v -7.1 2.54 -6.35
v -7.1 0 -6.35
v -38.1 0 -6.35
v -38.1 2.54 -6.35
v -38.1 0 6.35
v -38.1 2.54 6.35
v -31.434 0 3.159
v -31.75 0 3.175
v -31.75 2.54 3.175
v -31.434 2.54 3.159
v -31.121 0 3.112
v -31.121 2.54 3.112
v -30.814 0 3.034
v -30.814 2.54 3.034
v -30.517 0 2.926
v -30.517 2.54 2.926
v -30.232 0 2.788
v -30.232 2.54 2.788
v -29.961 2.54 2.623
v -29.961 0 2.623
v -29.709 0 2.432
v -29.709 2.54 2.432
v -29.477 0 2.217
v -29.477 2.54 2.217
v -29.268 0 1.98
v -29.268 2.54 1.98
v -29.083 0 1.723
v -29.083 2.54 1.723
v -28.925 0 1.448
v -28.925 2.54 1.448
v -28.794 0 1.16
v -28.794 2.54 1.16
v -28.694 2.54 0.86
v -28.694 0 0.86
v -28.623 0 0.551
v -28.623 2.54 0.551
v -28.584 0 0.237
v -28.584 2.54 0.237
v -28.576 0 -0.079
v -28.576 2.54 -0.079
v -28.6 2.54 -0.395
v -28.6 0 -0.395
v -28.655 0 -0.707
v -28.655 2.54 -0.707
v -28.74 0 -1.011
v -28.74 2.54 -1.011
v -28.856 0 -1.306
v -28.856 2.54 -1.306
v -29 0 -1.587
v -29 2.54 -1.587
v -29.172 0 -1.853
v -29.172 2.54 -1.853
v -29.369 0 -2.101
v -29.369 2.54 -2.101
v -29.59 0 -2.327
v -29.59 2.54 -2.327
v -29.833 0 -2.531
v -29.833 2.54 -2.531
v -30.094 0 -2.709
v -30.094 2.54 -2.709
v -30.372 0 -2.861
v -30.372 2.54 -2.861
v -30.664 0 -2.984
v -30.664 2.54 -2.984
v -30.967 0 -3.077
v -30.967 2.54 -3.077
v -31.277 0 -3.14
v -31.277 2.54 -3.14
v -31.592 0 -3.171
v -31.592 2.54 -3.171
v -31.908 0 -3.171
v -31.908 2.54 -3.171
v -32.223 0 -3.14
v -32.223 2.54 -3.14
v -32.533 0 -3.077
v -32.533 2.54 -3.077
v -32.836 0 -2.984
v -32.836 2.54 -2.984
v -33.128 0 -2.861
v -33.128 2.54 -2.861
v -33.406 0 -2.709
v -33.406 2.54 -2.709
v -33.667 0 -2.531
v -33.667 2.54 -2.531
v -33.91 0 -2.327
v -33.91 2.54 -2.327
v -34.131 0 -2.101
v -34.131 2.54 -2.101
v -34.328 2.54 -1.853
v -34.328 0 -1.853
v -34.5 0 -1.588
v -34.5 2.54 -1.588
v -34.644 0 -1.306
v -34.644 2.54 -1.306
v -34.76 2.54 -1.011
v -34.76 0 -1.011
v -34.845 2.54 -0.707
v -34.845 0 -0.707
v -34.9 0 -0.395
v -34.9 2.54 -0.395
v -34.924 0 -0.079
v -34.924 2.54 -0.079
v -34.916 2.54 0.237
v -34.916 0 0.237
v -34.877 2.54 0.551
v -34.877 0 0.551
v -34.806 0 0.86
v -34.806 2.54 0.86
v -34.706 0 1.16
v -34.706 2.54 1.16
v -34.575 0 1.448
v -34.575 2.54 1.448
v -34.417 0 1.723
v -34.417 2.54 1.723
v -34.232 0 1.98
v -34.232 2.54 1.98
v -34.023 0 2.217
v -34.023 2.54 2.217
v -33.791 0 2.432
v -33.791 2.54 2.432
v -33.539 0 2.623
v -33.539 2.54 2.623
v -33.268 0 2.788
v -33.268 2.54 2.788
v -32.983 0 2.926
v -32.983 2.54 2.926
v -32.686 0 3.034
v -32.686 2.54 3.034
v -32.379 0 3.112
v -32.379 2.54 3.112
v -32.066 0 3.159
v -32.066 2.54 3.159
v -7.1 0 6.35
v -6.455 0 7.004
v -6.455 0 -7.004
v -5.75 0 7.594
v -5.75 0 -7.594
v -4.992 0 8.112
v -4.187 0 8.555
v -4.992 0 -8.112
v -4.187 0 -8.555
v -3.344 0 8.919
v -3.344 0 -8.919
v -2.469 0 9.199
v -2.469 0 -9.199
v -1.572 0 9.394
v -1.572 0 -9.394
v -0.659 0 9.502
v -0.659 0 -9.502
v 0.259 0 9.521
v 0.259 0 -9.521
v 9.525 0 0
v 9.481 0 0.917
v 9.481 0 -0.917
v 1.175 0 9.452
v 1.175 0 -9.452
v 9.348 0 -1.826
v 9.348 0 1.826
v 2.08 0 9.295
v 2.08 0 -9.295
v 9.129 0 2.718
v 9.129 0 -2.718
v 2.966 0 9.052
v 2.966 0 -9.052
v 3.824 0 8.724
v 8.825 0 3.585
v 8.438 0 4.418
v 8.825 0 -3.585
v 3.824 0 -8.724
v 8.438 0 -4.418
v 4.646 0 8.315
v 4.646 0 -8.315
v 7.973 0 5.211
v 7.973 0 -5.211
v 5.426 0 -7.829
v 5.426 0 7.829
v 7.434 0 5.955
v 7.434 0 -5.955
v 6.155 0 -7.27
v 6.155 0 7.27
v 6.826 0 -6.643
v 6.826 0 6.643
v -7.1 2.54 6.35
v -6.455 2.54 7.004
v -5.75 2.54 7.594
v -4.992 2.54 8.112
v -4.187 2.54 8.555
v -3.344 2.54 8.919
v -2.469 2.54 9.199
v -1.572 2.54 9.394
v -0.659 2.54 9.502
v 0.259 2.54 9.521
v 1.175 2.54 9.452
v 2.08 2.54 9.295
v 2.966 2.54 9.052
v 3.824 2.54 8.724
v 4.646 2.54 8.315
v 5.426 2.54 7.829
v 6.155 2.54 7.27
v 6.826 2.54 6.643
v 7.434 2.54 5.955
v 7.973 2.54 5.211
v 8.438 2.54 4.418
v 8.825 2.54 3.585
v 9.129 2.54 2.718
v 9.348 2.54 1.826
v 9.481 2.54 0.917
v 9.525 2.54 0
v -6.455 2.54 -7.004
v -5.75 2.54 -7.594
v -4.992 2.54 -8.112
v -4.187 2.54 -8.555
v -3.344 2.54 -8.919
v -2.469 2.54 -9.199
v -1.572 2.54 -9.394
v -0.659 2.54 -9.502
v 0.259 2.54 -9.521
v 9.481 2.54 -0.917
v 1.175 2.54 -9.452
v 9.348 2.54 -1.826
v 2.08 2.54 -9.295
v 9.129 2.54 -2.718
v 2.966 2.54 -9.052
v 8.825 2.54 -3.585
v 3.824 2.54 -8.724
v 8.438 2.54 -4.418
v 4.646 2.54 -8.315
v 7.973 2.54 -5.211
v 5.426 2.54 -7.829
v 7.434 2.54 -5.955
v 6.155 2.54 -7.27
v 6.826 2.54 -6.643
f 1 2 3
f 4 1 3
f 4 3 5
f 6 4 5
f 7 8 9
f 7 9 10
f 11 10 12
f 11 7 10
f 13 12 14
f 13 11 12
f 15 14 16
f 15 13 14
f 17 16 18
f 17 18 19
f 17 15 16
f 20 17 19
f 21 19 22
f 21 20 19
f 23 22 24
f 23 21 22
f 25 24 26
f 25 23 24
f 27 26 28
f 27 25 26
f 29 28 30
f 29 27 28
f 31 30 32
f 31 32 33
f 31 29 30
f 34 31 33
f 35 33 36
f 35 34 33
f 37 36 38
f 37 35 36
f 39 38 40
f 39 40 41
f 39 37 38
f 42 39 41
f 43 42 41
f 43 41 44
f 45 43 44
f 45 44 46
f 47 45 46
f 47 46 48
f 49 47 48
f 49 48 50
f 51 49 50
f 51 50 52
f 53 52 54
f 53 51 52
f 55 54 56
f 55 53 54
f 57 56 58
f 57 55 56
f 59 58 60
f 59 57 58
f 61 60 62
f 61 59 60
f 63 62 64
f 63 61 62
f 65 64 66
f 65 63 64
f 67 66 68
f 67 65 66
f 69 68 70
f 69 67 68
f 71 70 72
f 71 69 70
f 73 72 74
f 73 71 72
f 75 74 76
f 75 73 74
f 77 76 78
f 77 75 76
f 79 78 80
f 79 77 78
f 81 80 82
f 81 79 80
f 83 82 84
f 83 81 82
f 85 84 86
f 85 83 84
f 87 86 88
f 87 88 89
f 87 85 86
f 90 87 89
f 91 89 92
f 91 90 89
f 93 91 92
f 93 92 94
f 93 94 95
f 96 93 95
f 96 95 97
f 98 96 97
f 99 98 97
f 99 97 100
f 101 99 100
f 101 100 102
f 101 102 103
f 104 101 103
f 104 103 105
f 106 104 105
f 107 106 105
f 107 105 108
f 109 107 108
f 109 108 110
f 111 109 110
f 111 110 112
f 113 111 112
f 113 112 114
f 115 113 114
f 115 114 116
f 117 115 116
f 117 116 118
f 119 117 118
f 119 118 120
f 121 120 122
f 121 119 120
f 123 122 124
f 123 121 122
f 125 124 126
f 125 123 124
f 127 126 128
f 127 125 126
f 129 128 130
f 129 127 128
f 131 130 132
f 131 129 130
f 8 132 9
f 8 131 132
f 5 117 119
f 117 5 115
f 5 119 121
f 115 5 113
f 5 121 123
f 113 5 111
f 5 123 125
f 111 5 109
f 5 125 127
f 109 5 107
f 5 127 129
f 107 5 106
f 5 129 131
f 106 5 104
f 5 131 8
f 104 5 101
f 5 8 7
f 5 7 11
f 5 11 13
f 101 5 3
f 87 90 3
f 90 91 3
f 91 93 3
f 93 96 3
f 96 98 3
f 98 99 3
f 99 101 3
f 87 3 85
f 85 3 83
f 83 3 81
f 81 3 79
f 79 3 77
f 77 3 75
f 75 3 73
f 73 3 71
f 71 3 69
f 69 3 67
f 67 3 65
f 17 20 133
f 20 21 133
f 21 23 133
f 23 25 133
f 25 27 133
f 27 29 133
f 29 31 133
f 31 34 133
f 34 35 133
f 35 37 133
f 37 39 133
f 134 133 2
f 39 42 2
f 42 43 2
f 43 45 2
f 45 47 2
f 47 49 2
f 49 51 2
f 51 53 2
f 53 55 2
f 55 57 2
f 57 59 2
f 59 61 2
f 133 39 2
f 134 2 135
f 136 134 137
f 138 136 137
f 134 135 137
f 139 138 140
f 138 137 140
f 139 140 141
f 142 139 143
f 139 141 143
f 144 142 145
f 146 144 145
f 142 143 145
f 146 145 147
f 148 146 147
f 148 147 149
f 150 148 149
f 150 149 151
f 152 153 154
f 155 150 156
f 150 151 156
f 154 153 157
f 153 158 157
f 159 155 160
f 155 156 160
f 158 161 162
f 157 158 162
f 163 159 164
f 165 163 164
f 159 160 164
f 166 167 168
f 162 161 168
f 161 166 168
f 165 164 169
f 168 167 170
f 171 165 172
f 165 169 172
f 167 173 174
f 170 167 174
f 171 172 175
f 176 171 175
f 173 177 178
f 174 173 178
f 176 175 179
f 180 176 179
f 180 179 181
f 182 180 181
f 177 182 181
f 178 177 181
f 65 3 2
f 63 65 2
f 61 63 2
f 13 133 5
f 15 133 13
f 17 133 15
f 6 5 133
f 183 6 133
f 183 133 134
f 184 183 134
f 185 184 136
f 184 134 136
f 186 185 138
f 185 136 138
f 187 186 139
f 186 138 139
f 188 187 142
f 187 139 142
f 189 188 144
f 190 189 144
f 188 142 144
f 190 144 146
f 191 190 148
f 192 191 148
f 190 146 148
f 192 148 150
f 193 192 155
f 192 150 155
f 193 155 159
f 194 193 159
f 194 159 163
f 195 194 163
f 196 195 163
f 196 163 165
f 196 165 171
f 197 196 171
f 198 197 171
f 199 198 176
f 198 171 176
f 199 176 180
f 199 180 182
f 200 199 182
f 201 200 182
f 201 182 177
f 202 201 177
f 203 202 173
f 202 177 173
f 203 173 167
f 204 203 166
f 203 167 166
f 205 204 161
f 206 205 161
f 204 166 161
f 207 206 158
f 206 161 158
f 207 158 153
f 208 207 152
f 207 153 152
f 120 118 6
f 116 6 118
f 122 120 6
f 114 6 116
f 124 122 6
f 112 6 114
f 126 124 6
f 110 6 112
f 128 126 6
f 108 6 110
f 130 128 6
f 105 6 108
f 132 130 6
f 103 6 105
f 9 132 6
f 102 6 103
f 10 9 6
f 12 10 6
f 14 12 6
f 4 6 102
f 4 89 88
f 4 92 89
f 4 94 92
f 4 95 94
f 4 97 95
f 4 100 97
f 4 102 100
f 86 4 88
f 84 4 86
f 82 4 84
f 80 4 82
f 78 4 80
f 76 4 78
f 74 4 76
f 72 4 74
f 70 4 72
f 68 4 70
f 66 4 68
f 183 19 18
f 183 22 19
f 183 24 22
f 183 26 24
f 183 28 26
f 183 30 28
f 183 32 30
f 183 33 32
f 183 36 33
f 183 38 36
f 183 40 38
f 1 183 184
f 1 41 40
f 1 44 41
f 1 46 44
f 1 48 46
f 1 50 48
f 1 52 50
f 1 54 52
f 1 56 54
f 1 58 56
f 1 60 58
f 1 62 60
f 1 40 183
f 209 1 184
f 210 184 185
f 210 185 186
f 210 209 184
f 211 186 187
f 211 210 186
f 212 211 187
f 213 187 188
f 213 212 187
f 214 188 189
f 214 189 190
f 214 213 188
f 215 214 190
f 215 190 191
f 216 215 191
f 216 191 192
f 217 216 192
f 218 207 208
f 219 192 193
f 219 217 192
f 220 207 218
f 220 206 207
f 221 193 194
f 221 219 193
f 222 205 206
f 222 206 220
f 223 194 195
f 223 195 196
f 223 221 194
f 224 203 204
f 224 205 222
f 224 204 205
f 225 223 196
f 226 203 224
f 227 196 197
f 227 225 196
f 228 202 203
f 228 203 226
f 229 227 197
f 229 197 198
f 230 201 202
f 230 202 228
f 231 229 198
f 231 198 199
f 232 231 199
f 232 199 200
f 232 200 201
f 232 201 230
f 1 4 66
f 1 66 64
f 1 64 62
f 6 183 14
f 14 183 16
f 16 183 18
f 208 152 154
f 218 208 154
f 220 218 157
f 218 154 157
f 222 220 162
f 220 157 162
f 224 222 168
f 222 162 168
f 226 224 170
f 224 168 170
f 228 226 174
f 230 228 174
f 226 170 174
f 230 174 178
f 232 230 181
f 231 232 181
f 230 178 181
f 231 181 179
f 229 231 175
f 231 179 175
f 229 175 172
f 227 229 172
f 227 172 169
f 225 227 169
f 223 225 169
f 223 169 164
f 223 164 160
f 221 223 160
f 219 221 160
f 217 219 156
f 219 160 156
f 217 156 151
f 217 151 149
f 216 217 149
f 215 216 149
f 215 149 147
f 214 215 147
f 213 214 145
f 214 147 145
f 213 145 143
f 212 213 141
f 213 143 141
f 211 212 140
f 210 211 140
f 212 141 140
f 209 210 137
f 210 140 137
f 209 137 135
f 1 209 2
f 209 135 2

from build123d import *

# Parameters (mm, degrees)
SKETCH1_R           = 3.175
BOSS_EXTRUDE1_DEPTH = 2.54


with BuildPart() as part:
    # Sketch1 → Boss-Extrude1 (new body)
    with BuildSketch(Plane(origin=(0, 0, 0), x_dir=(1, 0, 0), z_dir=(0, 1, 0))):
        with BuildLine():
            Line((-7.099515829, 6.35), (-38.1, 6.35))
            Line((-38.1, 6.35), (-38.1, -6.35))
            Line((-38.1, -6.35), (-7.099515829, -6.35))
            ThreePointArc((-7.099515829, -6.35), (9.525, 0), (-7.099515829, 6.35))
        make_face()
        with Locations((-31.75, 0)):
            Circle(SKETCH1_R, mode=Mode.SUBTRACT)
    extrude(amount=BOSS_EXTRUDE1_DEPTH)


solid = part.part
